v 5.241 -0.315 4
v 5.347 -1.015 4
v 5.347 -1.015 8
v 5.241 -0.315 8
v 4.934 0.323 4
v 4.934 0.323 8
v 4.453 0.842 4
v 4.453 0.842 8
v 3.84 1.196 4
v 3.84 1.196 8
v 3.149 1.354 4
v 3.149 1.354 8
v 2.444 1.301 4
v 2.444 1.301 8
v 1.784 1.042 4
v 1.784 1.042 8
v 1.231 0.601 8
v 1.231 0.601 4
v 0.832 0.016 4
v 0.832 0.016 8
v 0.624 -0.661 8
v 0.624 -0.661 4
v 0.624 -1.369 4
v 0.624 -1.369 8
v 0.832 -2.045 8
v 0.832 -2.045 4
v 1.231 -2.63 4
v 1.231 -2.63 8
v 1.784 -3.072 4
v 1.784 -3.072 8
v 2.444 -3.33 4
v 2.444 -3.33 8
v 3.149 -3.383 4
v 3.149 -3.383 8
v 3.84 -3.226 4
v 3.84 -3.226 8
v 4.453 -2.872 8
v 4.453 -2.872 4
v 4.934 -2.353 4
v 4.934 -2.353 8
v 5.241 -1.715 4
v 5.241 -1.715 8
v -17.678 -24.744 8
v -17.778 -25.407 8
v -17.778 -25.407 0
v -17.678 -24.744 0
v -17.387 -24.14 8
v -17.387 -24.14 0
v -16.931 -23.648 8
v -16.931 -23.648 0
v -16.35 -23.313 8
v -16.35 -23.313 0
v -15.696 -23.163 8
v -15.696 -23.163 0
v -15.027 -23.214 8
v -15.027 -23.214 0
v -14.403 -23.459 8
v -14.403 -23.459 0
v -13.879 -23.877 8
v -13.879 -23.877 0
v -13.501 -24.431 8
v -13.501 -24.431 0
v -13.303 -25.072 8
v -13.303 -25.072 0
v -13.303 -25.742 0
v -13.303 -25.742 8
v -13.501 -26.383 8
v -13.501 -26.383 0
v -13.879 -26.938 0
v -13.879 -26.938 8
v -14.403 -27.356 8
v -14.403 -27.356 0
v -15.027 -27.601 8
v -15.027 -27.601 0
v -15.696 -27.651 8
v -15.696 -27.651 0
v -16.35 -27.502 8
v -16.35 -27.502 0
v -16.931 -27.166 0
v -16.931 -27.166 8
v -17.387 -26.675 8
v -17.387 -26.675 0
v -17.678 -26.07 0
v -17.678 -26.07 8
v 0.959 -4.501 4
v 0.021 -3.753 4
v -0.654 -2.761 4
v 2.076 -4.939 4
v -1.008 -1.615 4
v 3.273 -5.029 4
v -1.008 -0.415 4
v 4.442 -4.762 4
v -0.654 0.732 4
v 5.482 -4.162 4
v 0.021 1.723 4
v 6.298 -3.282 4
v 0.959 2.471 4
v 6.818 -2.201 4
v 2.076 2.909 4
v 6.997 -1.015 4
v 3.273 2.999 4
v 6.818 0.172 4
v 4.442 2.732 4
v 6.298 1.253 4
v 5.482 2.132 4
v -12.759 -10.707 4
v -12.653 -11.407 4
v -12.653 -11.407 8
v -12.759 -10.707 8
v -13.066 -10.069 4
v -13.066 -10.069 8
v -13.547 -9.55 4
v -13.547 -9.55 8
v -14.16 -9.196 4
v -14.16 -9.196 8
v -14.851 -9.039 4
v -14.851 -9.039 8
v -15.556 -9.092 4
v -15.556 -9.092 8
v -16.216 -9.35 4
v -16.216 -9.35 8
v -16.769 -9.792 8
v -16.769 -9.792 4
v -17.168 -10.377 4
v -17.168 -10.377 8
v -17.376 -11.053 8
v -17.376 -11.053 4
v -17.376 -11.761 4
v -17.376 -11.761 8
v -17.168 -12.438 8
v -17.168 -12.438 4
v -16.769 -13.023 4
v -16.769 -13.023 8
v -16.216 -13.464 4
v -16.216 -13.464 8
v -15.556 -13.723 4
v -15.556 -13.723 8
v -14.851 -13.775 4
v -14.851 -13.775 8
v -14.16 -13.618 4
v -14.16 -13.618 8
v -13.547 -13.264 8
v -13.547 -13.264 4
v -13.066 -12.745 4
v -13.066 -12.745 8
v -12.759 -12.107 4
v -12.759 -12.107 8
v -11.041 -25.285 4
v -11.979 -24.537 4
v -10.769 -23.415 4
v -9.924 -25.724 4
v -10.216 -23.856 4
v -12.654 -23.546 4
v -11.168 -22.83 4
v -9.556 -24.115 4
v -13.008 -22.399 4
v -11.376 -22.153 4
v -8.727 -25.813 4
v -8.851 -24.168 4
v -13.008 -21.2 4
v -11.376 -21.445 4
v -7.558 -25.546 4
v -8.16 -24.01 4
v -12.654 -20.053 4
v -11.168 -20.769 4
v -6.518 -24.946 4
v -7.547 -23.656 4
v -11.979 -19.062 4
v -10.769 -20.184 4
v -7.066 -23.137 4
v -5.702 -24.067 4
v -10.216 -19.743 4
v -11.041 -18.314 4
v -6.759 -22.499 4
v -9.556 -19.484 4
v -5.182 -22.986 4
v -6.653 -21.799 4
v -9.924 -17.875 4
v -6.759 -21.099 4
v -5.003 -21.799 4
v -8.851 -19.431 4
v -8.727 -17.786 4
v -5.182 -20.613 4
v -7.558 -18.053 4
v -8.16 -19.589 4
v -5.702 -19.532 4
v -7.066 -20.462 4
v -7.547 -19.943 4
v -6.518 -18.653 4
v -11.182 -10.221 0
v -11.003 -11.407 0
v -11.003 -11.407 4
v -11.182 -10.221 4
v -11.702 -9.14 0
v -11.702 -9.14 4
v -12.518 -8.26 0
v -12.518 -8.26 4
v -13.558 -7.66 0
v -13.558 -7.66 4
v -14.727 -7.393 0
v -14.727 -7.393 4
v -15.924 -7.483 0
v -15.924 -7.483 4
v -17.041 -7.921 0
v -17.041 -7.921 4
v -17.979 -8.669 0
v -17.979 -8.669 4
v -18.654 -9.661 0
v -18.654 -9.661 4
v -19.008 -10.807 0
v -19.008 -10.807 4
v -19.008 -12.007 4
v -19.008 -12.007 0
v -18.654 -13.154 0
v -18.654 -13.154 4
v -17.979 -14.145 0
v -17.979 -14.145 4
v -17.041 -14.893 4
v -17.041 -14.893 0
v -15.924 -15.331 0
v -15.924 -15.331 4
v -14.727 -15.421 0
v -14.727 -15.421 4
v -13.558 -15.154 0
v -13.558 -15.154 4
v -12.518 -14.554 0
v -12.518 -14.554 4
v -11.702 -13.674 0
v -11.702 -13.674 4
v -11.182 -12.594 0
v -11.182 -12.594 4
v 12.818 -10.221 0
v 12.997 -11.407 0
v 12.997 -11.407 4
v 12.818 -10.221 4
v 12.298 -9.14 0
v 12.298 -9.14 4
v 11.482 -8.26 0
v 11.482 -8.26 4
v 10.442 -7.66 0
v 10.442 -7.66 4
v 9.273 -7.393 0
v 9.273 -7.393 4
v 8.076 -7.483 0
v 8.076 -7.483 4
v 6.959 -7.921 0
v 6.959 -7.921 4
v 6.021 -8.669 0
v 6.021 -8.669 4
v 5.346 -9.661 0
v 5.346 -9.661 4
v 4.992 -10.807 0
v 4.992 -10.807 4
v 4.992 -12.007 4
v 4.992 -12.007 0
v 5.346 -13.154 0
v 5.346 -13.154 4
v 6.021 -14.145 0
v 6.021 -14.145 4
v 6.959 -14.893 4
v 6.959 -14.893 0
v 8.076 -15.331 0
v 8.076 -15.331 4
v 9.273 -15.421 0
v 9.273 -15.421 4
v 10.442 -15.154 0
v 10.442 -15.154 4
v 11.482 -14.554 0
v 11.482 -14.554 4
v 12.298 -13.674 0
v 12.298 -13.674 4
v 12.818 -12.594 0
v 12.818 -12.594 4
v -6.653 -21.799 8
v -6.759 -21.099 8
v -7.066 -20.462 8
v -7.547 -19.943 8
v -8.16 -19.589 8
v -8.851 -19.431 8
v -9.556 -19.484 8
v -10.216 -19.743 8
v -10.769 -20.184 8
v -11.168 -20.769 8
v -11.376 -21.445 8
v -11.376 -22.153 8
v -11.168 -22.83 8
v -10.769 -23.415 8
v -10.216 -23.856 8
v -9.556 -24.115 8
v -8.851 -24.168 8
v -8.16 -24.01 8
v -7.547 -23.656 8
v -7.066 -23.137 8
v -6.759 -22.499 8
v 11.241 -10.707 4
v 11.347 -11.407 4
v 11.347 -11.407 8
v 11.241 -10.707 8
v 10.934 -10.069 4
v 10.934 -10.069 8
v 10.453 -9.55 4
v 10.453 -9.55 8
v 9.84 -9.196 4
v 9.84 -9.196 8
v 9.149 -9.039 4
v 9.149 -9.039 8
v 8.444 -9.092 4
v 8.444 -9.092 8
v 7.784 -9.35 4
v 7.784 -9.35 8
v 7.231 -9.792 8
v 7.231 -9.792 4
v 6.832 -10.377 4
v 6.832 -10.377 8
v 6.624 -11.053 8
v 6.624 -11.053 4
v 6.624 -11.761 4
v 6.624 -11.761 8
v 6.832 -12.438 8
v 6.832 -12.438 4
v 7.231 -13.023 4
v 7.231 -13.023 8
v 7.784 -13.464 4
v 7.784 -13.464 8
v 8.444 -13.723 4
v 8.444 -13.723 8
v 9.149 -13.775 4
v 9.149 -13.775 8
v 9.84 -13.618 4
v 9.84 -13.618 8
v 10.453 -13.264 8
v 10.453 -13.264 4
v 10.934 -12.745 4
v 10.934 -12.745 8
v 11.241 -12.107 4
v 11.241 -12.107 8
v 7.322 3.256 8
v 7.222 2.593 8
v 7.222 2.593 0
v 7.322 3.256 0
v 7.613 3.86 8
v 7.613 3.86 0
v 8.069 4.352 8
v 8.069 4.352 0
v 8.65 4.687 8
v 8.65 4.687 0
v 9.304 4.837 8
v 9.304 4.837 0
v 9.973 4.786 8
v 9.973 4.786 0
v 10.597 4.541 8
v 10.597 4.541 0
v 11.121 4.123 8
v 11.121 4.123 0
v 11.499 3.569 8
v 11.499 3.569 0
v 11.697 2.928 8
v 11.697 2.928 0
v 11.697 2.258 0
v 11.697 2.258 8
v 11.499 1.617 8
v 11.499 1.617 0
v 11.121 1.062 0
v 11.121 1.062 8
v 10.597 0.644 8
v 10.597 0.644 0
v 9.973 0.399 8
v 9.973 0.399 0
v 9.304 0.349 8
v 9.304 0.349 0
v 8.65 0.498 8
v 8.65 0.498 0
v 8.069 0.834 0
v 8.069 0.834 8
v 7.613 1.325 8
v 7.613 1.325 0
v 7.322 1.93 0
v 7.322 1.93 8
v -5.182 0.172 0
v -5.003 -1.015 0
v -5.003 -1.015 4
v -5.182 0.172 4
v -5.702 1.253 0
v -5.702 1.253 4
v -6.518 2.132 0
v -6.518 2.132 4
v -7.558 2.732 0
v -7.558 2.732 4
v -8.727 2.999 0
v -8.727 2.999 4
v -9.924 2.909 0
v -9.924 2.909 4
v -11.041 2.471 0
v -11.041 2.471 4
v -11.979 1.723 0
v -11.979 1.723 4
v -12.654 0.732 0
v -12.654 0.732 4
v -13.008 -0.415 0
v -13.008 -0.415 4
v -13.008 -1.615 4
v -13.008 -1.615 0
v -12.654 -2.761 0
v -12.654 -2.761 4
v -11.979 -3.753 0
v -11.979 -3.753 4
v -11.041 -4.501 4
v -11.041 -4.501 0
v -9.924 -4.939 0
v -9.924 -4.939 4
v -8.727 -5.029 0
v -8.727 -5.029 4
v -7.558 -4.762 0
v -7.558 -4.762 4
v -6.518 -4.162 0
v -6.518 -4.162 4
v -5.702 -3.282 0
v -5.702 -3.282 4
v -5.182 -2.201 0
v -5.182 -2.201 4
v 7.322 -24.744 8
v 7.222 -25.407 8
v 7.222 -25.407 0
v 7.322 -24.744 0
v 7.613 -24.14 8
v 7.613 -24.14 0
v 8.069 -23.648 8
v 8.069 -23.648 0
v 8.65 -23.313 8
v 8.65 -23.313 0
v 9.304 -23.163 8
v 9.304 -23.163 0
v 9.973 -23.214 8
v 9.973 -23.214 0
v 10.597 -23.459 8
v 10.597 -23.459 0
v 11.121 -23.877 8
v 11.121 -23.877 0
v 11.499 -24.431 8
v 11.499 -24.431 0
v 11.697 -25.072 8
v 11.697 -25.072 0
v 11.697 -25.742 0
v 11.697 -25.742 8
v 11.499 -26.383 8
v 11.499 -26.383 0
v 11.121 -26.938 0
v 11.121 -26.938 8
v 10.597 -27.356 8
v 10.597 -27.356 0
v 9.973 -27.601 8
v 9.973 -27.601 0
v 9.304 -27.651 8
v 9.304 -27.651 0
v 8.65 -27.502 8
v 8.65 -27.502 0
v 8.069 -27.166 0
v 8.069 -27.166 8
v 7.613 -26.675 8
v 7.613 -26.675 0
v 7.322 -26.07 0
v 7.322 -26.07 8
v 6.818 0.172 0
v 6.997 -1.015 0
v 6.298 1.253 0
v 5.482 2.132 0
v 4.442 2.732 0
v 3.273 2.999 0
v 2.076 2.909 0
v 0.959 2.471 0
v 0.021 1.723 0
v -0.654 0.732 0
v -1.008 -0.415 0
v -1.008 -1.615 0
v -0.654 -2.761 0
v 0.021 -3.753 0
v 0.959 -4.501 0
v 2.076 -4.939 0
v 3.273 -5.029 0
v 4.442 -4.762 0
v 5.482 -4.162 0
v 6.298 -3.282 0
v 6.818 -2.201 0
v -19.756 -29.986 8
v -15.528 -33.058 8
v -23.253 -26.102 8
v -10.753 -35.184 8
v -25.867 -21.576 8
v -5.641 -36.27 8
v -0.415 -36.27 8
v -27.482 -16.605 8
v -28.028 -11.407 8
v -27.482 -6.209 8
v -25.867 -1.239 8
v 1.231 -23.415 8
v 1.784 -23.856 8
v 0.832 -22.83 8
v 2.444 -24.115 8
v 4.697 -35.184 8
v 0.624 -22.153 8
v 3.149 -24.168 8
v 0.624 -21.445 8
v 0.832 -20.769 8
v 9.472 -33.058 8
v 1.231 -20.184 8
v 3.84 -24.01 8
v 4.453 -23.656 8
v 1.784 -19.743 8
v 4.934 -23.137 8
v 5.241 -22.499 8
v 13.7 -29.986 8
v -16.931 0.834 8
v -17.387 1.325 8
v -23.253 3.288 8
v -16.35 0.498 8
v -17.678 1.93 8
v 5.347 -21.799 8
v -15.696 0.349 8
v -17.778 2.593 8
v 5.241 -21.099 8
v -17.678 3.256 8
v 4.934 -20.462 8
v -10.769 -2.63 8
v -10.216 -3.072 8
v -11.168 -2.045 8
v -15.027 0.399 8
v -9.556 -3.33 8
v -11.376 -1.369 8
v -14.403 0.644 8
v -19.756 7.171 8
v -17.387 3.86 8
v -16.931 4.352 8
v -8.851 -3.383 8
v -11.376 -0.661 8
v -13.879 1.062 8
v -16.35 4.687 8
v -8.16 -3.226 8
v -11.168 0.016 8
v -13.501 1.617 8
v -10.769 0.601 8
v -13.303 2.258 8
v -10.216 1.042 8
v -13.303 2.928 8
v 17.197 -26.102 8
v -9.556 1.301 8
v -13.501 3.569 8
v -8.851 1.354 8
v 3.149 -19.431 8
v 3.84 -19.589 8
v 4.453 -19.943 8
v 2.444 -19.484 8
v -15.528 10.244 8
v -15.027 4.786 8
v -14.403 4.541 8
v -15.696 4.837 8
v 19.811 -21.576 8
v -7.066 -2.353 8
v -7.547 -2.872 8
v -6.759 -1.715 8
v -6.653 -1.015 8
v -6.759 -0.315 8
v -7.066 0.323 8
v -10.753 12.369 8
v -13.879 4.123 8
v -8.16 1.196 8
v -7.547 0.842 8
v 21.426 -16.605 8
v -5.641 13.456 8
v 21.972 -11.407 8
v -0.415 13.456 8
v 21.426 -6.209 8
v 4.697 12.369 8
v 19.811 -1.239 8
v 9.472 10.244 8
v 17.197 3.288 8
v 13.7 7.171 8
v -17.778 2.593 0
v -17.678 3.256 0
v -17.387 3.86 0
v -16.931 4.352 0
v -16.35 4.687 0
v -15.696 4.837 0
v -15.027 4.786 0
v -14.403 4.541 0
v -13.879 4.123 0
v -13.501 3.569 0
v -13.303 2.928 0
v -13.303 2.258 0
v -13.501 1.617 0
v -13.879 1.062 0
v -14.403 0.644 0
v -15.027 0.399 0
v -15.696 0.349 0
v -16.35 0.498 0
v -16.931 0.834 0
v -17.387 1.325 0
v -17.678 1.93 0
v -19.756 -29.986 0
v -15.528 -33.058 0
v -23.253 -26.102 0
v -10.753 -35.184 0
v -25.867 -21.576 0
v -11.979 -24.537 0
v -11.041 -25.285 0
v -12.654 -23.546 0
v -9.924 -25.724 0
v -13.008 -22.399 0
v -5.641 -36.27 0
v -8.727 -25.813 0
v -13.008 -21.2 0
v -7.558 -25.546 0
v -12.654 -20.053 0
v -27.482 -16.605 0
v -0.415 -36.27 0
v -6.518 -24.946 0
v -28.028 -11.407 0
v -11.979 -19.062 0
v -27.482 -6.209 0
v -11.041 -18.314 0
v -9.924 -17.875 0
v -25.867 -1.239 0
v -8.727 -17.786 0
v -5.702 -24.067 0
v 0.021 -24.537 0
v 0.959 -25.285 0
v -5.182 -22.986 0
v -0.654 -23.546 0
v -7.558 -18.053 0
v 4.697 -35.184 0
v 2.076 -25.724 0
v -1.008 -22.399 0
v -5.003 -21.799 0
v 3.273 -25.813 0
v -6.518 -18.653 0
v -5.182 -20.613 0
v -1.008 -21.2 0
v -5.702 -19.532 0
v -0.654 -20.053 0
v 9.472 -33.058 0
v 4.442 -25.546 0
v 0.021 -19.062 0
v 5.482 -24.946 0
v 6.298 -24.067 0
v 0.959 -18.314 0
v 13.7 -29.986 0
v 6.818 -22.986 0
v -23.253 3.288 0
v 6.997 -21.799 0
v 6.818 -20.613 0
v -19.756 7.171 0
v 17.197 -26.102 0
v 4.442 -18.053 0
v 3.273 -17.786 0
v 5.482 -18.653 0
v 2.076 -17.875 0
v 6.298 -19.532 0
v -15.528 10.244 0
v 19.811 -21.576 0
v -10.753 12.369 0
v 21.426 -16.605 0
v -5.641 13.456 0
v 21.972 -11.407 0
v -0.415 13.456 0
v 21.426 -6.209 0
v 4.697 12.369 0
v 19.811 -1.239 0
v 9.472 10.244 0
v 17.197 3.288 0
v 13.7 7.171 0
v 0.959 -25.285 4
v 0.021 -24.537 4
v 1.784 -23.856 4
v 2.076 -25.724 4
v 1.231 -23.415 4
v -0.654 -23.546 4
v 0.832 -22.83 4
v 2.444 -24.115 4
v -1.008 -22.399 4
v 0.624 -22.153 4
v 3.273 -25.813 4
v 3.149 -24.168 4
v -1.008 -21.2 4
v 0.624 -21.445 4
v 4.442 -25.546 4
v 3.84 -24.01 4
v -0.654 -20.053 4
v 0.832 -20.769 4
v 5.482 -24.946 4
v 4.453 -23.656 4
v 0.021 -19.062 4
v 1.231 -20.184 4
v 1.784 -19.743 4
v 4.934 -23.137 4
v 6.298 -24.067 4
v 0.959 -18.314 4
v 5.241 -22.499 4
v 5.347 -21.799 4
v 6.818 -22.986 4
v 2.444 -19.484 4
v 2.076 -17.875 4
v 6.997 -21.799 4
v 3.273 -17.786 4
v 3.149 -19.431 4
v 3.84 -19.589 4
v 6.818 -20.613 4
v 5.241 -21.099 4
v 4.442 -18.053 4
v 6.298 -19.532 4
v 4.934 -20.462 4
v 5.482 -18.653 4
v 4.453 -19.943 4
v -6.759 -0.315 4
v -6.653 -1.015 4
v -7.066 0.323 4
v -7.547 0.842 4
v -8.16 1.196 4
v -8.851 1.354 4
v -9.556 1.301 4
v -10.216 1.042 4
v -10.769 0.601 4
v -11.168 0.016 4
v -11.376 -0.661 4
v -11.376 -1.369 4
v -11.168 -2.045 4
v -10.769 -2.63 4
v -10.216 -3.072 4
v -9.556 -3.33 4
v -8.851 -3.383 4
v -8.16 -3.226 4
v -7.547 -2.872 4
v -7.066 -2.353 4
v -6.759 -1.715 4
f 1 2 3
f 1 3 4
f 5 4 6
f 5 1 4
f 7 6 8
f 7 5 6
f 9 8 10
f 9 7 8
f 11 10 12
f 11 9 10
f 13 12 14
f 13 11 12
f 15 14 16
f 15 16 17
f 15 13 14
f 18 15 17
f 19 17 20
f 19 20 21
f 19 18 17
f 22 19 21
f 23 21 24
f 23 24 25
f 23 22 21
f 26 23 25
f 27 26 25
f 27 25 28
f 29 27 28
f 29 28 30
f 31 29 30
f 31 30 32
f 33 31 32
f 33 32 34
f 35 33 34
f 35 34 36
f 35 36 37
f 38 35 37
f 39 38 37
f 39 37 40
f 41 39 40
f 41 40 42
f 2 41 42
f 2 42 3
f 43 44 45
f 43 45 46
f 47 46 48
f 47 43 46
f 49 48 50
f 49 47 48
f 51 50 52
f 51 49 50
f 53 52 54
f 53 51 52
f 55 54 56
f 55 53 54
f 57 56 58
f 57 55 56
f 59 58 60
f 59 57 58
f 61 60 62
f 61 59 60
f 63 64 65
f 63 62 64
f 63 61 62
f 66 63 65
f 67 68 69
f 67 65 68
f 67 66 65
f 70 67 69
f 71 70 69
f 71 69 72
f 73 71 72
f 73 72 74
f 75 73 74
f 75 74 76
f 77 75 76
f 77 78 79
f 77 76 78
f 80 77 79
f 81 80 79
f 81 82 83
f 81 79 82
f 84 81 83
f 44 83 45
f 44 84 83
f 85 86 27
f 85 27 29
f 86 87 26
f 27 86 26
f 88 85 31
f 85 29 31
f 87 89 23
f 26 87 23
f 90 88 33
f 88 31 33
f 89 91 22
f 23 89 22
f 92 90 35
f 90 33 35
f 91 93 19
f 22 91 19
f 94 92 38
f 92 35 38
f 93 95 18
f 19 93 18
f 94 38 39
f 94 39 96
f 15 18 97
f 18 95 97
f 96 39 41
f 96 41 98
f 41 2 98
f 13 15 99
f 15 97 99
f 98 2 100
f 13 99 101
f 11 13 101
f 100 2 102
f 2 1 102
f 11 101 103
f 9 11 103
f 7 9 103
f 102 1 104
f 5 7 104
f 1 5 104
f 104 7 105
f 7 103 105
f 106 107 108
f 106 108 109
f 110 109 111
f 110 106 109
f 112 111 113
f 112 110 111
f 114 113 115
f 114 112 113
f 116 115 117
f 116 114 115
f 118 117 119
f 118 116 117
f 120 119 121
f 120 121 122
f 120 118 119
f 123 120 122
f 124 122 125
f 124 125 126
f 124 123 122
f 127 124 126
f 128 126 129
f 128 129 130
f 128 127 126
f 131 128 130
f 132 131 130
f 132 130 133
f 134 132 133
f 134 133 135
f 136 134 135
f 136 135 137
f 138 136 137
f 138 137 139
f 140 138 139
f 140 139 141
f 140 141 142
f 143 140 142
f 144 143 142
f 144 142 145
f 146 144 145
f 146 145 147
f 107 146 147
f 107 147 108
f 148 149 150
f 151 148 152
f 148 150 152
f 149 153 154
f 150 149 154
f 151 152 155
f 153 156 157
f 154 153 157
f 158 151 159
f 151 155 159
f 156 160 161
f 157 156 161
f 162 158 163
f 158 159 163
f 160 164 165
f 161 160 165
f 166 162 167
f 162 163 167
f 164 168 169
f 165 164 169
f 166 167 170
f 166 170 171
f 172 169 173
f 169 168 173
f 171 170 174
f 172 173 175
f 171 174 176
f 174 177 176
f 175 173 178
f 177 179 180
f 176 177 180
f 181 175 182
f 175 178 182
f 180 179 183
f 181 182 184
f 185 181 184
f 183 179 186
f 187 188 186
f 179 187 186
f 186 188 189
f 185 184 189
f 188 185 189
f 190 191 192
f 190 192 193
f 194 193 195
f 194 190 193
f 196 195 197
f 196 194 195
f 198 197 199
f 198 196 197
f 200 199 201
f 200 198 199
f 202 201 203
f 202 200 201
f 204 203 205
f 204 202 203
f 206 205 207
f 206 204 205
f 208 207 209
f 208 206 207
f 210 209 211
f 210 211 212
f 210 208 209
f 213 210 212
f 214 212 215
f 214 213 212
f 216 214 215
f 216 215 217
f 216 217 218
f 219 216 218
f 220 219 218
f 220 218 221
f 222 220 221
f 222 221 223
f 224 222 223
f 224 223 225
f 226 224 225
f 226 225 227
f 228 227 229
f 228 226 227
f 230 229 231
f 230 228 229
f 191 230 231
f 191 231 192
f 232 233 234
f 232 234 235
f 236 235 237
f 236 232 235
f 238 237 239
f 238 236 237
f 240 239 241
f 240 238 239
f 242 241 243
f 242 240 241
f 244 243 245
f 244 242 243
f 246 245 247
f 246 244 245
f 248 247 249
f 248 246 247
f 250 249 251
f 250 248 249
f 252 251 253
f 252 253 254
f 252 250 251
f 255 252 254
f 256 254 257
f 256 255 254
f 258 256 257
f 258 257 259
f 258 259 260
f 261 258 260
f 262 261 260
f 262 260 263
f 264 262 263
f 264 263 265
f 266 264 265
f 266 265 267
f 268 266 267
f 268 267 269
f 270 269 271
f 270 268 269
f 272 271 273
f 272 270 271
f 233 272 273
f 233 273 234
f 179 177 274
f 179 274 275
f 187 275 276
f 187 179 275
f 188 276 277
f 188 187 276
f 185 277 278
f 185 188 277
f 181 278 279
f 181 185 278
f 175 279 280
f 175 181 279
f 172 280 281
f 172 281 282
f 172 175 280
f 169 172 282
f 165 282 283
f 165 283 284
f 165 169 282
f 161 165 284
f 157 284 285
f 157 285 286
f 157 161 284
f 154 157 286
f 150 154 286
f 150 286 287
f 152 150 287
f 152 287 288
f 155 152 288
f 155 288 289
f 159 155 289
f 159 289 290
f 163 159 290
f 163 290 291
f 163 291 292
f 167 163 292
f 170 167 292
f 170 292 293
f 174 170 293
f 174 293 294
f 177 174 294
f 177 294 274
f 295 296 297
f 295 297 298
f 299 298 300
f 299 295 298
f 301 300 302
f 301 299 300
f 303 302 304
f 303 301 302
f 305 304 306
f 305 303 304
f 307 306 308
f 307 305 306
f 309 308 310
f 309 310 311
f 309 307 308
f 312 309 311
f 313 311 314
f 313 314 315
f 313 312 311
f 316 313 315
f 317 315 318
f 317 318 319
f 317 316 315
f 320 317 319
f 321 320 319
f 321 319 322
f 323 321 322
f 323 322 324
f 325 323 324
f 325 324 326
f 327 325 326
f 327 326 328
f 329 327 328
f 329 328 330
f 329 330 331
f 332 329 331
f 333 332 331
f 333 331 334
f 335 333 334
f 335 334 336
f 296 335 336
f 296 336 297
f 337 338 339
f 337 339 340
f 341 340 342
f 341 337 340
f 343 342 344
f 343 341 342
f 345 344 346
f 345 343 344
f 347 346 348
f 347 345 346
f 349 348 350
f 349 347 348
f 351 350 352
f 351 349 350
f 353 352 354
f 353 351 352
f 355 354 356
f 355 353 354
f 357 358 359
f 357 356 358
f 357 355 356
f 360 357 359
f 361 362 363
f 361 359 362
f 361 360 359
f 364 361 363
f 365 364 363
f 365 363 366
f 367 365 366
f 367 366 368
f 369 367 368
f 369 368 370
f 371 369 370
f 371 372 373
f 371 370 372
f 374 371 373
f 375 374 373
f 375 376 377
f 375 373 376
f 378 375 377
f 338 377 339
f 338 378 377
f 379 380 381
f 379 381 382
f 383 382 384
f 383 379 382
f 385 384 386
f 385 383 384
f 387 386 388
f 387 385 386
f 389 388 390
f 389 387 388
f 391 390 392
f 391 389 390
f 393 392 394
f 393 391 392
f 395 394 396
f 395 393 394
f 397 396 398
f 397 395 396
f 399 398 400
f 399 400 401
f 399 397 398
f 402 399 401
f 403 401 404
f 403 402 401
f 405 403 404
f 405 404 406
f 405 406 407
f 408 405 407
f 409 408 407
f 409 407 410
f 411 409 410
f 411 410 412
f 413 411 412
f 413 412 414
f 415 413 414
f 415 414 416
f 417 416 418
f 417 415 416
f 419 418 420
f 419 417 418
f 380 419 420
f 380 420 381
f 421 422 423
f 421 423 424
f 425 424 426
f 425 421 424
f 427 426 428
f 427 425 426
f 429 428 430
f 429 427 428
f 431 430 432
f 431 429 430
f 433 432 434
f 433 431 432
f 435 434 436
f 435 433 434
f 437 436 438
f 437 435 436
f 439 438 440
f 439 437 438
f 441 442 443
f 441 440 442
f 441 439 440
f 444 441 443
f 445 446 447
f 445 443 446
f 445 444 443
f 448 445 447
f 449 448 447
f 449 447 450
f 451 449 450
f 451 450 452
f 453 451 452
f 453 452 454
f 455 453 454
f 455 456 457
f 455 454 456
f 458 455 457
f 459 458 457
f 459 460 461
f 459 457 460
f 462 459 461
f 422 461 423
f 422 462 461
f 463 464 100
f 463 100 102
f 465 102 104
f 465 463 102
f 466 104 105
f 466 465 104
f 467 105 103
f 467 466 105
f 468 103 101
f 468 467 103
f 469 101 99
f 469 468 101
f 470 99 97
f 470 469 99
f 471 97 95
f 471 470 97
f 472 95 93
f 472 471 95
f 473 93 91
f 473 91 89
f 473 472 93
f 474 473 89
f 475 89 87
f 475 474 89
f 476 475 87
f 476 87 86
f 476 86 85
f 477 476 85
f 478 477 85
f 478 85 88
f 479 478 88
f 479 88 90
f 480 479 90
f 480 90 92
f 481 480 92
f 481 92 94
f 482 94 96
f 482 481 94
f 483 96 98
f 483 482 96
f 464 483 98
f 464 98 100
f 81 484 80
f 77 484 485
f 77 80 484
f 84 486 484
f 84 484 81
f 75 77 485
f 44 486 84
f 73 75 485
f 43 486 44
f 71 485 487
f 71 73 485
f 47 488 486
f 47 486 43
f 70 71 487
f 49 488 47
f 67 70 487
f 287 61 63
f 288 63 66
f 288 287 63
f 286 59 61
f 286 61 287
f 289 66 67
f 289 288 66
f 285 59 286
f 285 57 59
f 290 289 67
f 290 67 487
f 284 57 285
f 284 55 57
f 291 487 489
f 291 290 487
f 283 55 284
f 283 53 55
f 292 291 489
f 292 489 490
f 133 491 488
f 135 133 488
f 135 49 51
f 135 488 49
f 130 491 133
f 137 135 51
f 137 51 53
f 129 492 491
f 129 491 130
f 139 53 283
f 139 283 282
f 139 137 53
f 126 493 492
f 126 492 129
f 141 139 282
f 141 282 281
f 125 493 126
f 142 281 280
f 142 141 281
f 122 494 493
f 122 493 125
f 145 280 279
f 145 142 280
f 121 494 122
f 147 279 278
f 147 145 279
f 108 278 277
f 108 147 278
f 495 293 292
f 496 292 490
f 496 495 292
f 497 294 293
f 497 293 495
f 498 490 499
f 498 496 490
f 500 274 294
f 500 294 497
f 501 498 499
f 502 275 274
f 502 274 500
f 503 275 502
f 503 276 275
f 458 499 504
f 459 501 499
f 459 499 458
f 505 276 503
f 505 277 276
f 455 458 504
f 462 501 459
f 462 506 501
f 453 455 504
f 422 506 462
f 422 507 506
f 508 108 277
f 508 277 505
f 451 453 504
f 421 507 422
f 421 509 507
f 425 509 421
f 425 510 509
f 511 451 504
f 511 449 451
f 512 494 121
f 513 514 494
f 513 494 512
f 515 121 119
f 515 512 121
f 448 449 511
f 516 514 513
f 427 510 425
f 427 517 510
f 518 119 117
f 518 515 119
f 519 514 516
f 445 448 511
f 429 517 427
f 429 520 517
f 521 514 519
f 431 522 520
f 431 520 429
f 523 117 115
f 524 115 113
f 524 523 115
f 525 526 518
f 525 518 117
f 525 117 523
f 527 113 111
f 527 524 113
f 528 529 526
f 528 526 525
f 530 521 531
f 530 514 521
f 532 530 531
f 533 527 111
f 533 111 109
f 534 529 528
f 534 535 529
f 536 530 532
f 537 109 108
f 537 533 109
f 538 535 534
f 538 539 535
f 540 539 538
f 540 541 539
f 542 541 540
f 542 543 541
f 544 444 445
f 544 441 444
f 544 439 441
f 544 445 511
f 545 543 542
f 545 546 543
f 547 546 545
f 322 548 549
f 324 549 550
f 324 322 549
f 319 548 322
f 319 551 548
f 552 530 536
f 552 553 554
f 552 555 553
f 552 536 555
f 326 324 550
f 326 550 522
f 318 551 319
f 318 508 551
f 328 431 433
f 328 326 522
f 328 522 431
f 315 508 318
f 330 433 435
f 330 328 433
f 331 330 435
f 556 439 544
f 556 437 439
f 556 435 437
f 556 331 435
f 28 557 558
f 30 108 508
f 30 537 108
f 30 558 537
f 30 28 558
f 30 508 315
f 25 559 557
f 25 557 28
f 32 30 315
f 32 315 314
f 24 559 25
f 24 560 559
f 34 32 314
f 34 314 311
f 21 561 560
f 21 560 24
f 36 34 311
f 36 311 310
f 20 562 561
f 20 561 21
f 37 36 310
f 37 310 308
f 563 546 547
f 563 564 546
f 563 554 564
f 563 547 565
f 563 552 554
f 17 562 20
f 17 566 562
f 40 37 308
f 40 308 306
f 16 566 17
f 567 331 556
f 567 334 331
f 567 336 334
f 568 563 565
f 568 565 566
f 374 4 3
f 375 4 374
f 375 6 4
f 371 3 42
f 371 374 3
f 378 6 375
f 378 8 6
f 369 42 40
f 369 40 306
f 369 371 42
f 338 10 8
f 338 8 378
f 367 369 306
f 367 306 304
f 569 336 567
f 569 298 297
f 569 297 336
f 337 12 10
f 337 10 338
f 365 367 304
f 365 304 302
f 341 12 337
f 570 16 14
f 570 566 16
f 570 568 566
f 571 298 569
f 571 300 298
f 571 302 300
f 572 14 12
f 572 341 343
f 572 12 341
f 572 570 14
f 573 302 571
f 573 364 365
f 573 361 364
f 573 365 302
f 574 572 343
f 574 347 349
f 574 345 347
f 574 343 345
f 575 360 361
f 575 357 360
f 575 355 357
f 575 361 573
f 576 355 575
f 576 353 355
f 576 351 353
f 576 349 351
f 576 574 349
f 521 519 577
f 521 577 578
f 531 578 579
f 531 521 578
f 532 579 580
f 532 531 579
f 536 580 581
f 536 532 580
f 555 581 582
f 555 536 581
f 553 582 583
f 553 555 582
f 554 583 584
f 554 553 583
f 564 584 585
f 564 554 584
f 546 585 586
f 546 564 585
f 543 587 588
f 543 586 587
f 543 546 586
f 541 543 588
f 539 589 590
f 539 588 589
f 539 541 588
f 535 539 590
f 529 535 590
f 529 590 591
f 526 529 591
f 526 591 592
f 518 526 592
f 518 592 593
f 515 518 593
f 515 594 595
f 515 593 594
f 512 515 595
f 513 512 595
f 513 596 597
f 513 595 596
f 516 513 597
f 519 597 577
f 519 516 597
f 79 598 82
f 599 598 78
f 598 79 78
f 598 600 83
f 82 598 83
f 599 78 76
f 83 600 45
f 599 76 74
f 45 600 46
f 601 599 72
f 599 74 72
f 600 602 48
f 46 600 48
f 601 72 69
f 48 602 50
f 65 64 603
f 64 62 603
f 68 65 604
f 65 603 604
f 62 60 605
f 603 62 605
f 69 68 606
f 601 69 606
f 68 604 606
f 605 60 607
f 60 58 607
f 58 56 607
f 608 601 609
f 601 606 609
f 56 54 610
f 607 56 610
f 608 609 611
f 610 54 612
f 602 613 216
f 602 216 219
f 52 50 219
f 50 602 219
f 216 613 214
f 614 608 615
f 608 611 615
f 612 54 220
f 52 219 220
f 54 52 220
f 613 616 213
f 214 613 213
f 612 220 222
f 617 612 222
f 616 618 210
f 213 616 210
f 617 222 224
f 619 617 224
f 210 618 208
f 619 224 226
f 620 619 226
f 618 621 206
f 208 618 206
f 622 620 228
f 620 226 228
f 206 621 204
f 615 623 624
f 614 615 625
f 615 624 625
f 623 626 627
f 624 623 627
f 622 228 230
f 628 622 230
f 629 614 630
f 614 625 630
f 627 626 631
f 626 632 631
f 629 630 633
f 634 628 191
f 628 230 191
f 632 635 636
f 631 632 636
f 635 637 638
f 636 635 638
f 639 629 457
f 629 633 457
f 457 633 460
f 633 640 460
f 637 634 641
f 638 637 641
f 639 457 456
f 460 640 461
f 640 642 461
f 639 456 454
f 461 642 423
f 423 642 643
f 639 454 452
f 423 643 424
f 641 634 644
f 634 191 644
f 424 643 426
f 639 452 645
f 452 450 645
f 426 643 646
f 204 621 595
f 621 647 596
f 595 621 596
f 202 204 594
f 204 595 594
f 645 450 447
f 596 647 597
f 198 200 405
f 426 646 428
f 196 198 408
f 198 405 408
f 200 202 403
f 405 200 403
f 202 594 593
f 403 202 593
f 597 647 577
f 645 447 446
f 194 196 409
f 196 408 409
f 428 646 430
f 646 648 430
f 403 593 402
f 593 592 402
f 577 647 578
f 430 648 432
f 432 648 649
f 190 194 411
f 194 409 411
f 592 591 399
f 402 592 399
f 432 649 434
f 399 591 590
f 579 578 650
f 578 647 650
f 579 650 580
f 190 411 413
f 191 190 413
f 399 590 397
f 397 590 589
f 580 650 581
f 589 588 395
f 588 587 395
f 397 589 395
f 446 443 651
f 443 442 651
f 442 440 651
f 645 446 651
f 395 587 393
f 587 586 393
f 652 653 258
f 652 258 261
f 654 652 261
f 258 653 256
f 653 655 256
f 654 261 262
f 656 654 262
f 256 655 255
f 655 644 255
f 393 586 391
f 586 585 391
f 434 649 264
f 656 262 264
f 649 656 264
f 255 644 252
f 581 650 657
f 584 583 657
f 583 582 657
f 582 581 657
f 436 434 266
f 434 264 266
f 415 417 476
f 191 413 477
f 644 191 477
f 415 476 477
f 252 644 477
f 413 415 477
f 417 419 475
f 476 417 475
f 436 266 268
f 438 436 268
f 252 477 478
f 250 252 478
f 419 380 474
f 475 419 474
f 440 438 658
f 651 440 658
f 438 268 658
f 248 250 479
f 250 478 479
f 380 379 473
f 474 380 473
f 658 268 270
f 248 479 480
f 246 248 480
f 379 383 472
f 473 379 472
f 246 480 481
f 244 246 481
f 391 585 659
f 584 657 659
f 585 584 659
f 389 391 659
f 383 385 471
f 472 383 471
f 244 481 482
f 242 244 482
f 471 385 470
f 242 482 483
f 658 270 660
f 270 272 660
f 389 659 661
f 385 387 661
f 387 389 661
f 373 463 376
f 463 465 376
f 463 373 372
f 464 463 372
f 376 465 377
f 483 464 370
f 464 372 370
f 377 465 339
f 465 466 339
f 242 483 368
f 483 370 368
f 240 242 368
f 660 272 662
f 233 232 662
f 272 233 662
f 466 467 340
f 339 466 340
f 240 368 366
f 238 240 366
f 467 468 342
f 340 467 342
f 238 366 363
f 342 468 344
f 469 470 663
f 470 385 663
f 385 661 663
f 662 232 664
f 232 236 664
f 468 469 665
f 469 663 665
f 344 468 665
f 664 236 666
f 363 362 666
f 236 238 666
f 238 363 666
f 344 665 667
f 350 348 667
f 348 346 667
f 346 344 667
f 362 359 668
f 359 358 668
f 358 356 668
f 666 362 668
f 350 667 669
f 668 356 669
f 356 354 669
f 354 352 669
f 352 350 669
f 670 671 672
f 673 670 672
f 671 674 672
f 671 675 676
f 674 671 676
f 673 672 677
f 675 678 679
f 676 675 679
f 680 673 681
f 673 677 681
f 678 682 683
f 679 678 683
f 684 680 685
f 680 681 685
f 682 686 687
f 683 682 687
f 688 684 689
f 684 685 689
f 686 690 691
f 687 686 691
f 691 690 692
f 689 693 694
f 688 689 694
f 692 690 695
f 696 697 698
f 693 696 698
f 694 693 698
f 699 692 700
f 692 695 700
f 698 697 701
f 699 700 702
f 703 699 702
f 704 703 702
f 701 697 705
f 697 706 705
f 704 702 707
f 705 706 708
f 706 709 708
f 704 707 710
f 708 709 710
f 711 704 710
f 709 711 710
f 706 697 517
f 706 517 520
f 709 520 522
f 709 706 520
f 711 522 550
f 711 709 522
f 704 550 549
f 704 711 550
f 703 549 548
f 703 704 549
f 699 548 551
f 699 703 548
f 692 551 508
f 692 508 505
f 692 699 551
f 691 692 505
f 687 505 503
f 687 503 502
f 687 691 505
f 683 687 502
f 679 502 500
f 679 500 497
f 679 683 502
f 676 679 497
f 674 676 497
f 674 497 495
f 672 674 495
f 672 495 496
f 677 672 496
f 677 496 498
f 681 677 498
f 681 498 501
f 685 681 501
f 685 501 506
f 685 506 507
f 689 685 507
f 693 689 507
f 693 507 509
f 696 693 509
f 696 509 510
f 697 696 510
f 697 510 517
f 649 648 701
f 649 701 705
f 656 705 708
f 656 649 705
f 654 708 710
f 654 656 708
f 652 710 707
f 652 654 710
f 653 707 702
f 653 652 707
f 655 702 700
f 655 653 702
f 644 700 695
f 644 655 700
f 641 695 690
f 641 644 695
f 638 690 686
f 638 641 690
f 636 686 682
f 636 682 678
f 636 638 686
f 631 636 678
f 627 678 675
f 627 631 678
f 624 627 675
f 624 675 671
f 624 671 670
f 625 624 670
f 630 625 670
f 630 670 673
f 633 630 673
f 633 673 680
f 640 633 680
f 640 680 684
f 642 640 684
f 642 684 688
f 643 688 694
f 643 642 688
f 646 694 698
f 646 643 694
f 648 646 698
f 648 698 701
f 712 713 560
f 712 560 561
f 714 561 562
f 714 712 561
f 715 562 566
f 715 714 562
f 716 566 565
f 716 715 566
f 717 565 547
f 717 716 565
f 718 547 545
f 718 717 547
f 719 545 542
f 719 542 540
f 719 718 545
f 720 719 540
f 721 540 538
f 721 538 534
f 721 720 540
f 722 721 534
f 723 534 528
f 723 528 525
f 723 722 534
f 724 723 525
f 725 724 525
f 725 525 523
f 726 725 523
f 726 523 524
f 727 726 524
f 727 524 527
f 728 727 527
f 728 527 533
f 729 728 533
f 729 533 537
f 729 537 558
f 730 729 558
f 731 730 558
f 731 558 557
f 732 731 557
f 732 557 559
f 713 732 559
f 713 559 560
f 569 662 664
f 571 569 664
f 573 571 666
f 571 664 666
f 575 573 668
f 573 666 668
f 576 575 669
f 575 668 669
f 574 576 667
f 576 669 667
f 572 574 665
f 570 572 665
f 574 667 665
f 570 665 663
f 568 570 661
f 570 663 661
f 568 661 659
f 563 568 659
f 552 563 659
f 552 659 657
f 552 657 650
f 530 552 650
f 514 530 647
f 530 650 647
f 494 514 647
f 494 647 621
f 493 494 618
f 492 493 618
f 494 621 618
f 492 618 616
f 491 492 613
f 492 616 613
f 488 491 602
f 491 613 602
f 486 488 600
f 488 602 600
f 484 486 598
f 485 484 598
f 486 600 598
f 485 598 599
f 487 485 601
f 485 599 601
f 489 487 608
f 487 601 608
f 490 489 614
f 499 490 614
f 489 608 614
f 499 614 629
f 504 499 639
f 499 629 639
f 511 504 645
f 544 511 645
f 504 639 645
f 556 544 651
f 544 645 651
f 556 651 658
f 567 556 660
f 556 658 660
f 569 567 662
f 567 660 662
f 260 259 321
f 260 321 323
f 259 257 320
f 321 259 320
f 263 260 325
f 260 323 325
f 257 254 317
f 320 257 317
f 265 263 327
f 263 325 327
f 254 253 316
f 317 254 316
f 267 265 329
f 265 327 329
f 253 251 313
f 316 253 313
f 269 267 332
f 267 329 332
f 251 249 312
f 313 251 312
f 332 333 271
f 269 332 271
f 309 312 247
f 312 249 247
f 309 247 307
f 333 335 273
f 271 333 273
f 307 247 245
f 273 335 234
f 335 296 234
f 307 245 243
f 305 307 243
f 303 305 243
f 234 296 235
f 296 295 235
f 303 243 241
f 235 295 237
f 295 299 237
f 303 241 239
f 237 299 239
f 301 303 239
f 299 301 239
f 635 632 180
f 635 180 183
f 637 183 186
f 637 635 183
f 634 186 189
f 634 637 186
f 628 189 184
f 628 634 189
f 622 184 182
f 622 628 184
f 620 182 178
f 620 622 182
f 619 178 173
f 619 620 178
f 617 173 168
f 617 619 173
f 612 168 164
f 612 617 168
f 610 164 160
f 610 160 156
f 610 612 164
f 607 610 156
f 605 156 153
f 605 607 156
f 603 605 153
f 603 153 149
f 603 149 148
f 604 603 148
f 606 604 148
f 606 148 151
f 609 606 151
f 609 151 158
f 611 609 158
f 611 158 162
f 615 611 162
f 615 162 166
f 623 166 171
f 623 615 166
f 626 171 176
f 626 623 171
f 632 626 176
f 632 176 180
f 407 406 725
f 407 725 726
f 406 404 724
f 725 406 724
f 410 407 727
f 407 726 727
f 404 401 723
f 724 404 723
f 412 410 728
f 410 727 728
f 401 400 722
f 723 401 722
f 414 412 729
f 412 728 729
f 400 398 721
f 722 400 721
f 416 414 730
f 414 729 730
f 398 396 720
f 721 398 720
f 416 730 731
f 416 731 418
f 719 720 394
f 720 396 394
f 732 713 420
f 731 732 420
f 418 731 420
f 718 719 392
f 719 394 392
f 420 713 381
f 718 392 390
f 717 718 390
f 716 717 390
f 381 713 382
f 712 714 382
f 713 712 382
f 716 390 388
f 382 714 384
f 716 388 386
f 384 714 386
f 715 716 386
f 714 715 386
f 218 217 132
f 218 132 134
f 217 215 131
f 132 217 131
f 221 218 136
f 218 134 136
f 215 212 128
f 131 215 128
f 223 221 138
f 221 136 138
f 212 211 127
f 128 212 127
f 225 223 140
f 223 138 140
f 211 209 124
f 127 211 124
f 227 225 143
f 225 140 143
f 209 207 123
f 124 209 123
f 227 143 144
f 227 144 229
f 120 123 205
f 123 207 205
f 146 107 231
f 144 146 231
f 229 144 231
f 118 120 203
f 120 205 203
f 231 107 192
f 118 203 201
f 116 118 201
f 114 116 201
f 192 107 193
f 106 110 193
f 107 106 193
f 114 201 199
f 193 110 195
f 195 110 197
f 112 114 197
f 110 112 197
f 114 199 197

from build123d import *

# Parameters (mm, degrees)
SKETCH2_R               = 25
SKETCH2_R_2             = 4.025
SKETCH2_R_3             = 6.25
SKETCH2_R_4             = 2.375
BOSS_EXTRUDE2_DEPTH     = 8
CUT_EXTRUDE1_DEPTH      = 47.637413369
CUT_EXTRUDE1_DEPTH_BACK = 47.637413369
SKETCH3_R               = 2.25
SKETCH2_4_R             = 4.025
CUT_EXTRUDE2_DEPTH      = 4


with BuildPart() as part:
    # Sketch2 → Boss-Extrude2 (new body)
    # profile 1 of 8: a face of its own
    with BuildSketch(Plane.XY):
        with Locations((-3.028012221, -11.407126455)):
            Circle(SKETCH2_R)
        with Locations((-15.028012221, -11.407126455)):
            Circle(SKETCH2_R_2, mode=Mode.SUBTRACT)
        with Locations((-9.028012221, -1.014821609)):
            Circle(SKETCH2_R_2, mode=Mode.SUBTRACT)
        with Locations((2.971987779, -1.014821609)):
            Circle(SKETCH2_R_2, mode=Mode.SUBTRACT)
        with Locations((8.971987779, -11.407126455)):
            Circle(SKETCH2_R_2, mode=Mode.SUBTRACT)
        with Locations((2.971987779, -21.7994313)):
            Circle(SKETCH2_R_2, mode=Mode.SUBTRACT)
        with Locations((-9.028012221, -21.7994313)):
            Circle(SKETCH2_R_2, mode=Mode.SUBTRACT)
        with Locations((-3.028012221, -11.407126455)):
            Circle(SKETCH2_R_3, mode=Mode.SUBTRACT)
    # profile 2 of 8: a face of its own
    with BuildSketch(Plane.XY):
        with Locations((-15.028012221, -11.407126455)):
            Circle(SKETCH2_R_2)
        with Locations((-15.028012221, -11.407126455)):
            Circle(SKETCH2_R_4, mode=Mode.SUBTRACT)
    # profile 3 of 8: a face of its own
    with BuildSketch(Plane.XY):
        with Locations((-3.028012221, -11.407126455)):
            Circle(SKETCH2_R_3)
    # profile 4 of 8: a face of its own
    with BuildSketch(Plane.XY):
        with Locations((-9.028012221, -1.014821609)):
            Circle(SKETCH2_R_2)
        with Locations((-9.028012221, -1.014821609)):
            Circle(SKETCH2_R_4, mode=Mode.SUBTRACT)
    # profile 5 of 8: a face of its own
    with BuildSketch(Plane.XY):
        with Locations((2.971987779, -1.014821609)):
            Circle(SKETCH2_R_2)
        with Locations((2.971987779, -1.014821609)):
            Circle(SKETCH2_R_4, mode=Mode.SUBTRACT)
    # profile 6 of 8: a face of its own
    with BuildSketch(Plane.XY):
        with Locations((8.971987779, -11.407126455)):
            Circle(SKETCH2_R_2)
        with Locations((8.971987779, -11.407126455)):
            Circle(SKETCH2_R_4, mode=Mode.SUBTRACT)
    # profile 7 of 8: a face of its own
    with BuildSketch(Plane.XY):
        with Locations((2.971987779, -21.7994313)):
            Circle(SKETCH2_R_2)
        with Locations((2.971987779, -21.7994313)):
            Circle(SKETCH2_R_4, mode=Mode.SUBTRACT)
    # profile 8 of 8: a face of its own
    with BuildSketch(Plane.XY):
        with Locations((-9.028012221, -21.7994313)):
            Circle(SKETCH2_R_2)
        with Locations((-9.028012221, -21.7994313)):
            Circle(SKETCH2_R_4, mode=Mode.SUBTRACT)
    extrude(amount=BOSS_EXTRUDE2_DEPTH)

    # Sketch3 → Cut-Extrude1 (cut, two sides: drawn at the far end of the back side and taken through both)
    with BuildSketch(Plane(origin=(0, 0, 0), x_dir=(-1, 0, 0), z_dir=(0, 0, -1)).offset(-CUT_EXTRUDE1_DEPTH_BACK)):
        with Locations((-9.471987779, 2.592873545)):
            Circle(SKETCH3_R)
        with Locations((15.528012221, 2.592873545)):
            Circle(SKETCH3_R)
        with Locations((15.528012221, -25.407126455)):
            Circle(SKETCH3_R)
        with Locations((-9.471987779, -25.407126455)):
            Circle(SKETCH3_R)
    extrude(amount=CUT_EXTRUDE1_DEPTH + CUT_EXTRUDE1_DEPTH_BACK, mode=Mode.SUBTRACT)

    # Sketch2<4> → Cut-Extrude2 (cut)
    with BuildSketch(Plane.XY):
        with Locations((-15.028012221, -11.407126455)):
            Circle(SKETCH2_4_R)
        with Locations((-9.028012221, -1.014821609)):
            Circle(SKETCH2_4_R)
        with Locations((2.971987779, -1.014821609)):
            Circle(SKETCH2_4_R)
        with Locations((8.971987779, -11.407126455)):
            Circle(SKETCH2_4_R)
        with Locations((2.971987779, -21.7994313)):
            Circle(SKETCH2_4_R)
        with Locations((-9.028012221, -21.7994313)):
            Circle(SKETCH2_4_R)
    extrude(amount=CUT_EXTRUDE2_DEPTH, mode=Mode.SUBTRACT)


solid = part.part
